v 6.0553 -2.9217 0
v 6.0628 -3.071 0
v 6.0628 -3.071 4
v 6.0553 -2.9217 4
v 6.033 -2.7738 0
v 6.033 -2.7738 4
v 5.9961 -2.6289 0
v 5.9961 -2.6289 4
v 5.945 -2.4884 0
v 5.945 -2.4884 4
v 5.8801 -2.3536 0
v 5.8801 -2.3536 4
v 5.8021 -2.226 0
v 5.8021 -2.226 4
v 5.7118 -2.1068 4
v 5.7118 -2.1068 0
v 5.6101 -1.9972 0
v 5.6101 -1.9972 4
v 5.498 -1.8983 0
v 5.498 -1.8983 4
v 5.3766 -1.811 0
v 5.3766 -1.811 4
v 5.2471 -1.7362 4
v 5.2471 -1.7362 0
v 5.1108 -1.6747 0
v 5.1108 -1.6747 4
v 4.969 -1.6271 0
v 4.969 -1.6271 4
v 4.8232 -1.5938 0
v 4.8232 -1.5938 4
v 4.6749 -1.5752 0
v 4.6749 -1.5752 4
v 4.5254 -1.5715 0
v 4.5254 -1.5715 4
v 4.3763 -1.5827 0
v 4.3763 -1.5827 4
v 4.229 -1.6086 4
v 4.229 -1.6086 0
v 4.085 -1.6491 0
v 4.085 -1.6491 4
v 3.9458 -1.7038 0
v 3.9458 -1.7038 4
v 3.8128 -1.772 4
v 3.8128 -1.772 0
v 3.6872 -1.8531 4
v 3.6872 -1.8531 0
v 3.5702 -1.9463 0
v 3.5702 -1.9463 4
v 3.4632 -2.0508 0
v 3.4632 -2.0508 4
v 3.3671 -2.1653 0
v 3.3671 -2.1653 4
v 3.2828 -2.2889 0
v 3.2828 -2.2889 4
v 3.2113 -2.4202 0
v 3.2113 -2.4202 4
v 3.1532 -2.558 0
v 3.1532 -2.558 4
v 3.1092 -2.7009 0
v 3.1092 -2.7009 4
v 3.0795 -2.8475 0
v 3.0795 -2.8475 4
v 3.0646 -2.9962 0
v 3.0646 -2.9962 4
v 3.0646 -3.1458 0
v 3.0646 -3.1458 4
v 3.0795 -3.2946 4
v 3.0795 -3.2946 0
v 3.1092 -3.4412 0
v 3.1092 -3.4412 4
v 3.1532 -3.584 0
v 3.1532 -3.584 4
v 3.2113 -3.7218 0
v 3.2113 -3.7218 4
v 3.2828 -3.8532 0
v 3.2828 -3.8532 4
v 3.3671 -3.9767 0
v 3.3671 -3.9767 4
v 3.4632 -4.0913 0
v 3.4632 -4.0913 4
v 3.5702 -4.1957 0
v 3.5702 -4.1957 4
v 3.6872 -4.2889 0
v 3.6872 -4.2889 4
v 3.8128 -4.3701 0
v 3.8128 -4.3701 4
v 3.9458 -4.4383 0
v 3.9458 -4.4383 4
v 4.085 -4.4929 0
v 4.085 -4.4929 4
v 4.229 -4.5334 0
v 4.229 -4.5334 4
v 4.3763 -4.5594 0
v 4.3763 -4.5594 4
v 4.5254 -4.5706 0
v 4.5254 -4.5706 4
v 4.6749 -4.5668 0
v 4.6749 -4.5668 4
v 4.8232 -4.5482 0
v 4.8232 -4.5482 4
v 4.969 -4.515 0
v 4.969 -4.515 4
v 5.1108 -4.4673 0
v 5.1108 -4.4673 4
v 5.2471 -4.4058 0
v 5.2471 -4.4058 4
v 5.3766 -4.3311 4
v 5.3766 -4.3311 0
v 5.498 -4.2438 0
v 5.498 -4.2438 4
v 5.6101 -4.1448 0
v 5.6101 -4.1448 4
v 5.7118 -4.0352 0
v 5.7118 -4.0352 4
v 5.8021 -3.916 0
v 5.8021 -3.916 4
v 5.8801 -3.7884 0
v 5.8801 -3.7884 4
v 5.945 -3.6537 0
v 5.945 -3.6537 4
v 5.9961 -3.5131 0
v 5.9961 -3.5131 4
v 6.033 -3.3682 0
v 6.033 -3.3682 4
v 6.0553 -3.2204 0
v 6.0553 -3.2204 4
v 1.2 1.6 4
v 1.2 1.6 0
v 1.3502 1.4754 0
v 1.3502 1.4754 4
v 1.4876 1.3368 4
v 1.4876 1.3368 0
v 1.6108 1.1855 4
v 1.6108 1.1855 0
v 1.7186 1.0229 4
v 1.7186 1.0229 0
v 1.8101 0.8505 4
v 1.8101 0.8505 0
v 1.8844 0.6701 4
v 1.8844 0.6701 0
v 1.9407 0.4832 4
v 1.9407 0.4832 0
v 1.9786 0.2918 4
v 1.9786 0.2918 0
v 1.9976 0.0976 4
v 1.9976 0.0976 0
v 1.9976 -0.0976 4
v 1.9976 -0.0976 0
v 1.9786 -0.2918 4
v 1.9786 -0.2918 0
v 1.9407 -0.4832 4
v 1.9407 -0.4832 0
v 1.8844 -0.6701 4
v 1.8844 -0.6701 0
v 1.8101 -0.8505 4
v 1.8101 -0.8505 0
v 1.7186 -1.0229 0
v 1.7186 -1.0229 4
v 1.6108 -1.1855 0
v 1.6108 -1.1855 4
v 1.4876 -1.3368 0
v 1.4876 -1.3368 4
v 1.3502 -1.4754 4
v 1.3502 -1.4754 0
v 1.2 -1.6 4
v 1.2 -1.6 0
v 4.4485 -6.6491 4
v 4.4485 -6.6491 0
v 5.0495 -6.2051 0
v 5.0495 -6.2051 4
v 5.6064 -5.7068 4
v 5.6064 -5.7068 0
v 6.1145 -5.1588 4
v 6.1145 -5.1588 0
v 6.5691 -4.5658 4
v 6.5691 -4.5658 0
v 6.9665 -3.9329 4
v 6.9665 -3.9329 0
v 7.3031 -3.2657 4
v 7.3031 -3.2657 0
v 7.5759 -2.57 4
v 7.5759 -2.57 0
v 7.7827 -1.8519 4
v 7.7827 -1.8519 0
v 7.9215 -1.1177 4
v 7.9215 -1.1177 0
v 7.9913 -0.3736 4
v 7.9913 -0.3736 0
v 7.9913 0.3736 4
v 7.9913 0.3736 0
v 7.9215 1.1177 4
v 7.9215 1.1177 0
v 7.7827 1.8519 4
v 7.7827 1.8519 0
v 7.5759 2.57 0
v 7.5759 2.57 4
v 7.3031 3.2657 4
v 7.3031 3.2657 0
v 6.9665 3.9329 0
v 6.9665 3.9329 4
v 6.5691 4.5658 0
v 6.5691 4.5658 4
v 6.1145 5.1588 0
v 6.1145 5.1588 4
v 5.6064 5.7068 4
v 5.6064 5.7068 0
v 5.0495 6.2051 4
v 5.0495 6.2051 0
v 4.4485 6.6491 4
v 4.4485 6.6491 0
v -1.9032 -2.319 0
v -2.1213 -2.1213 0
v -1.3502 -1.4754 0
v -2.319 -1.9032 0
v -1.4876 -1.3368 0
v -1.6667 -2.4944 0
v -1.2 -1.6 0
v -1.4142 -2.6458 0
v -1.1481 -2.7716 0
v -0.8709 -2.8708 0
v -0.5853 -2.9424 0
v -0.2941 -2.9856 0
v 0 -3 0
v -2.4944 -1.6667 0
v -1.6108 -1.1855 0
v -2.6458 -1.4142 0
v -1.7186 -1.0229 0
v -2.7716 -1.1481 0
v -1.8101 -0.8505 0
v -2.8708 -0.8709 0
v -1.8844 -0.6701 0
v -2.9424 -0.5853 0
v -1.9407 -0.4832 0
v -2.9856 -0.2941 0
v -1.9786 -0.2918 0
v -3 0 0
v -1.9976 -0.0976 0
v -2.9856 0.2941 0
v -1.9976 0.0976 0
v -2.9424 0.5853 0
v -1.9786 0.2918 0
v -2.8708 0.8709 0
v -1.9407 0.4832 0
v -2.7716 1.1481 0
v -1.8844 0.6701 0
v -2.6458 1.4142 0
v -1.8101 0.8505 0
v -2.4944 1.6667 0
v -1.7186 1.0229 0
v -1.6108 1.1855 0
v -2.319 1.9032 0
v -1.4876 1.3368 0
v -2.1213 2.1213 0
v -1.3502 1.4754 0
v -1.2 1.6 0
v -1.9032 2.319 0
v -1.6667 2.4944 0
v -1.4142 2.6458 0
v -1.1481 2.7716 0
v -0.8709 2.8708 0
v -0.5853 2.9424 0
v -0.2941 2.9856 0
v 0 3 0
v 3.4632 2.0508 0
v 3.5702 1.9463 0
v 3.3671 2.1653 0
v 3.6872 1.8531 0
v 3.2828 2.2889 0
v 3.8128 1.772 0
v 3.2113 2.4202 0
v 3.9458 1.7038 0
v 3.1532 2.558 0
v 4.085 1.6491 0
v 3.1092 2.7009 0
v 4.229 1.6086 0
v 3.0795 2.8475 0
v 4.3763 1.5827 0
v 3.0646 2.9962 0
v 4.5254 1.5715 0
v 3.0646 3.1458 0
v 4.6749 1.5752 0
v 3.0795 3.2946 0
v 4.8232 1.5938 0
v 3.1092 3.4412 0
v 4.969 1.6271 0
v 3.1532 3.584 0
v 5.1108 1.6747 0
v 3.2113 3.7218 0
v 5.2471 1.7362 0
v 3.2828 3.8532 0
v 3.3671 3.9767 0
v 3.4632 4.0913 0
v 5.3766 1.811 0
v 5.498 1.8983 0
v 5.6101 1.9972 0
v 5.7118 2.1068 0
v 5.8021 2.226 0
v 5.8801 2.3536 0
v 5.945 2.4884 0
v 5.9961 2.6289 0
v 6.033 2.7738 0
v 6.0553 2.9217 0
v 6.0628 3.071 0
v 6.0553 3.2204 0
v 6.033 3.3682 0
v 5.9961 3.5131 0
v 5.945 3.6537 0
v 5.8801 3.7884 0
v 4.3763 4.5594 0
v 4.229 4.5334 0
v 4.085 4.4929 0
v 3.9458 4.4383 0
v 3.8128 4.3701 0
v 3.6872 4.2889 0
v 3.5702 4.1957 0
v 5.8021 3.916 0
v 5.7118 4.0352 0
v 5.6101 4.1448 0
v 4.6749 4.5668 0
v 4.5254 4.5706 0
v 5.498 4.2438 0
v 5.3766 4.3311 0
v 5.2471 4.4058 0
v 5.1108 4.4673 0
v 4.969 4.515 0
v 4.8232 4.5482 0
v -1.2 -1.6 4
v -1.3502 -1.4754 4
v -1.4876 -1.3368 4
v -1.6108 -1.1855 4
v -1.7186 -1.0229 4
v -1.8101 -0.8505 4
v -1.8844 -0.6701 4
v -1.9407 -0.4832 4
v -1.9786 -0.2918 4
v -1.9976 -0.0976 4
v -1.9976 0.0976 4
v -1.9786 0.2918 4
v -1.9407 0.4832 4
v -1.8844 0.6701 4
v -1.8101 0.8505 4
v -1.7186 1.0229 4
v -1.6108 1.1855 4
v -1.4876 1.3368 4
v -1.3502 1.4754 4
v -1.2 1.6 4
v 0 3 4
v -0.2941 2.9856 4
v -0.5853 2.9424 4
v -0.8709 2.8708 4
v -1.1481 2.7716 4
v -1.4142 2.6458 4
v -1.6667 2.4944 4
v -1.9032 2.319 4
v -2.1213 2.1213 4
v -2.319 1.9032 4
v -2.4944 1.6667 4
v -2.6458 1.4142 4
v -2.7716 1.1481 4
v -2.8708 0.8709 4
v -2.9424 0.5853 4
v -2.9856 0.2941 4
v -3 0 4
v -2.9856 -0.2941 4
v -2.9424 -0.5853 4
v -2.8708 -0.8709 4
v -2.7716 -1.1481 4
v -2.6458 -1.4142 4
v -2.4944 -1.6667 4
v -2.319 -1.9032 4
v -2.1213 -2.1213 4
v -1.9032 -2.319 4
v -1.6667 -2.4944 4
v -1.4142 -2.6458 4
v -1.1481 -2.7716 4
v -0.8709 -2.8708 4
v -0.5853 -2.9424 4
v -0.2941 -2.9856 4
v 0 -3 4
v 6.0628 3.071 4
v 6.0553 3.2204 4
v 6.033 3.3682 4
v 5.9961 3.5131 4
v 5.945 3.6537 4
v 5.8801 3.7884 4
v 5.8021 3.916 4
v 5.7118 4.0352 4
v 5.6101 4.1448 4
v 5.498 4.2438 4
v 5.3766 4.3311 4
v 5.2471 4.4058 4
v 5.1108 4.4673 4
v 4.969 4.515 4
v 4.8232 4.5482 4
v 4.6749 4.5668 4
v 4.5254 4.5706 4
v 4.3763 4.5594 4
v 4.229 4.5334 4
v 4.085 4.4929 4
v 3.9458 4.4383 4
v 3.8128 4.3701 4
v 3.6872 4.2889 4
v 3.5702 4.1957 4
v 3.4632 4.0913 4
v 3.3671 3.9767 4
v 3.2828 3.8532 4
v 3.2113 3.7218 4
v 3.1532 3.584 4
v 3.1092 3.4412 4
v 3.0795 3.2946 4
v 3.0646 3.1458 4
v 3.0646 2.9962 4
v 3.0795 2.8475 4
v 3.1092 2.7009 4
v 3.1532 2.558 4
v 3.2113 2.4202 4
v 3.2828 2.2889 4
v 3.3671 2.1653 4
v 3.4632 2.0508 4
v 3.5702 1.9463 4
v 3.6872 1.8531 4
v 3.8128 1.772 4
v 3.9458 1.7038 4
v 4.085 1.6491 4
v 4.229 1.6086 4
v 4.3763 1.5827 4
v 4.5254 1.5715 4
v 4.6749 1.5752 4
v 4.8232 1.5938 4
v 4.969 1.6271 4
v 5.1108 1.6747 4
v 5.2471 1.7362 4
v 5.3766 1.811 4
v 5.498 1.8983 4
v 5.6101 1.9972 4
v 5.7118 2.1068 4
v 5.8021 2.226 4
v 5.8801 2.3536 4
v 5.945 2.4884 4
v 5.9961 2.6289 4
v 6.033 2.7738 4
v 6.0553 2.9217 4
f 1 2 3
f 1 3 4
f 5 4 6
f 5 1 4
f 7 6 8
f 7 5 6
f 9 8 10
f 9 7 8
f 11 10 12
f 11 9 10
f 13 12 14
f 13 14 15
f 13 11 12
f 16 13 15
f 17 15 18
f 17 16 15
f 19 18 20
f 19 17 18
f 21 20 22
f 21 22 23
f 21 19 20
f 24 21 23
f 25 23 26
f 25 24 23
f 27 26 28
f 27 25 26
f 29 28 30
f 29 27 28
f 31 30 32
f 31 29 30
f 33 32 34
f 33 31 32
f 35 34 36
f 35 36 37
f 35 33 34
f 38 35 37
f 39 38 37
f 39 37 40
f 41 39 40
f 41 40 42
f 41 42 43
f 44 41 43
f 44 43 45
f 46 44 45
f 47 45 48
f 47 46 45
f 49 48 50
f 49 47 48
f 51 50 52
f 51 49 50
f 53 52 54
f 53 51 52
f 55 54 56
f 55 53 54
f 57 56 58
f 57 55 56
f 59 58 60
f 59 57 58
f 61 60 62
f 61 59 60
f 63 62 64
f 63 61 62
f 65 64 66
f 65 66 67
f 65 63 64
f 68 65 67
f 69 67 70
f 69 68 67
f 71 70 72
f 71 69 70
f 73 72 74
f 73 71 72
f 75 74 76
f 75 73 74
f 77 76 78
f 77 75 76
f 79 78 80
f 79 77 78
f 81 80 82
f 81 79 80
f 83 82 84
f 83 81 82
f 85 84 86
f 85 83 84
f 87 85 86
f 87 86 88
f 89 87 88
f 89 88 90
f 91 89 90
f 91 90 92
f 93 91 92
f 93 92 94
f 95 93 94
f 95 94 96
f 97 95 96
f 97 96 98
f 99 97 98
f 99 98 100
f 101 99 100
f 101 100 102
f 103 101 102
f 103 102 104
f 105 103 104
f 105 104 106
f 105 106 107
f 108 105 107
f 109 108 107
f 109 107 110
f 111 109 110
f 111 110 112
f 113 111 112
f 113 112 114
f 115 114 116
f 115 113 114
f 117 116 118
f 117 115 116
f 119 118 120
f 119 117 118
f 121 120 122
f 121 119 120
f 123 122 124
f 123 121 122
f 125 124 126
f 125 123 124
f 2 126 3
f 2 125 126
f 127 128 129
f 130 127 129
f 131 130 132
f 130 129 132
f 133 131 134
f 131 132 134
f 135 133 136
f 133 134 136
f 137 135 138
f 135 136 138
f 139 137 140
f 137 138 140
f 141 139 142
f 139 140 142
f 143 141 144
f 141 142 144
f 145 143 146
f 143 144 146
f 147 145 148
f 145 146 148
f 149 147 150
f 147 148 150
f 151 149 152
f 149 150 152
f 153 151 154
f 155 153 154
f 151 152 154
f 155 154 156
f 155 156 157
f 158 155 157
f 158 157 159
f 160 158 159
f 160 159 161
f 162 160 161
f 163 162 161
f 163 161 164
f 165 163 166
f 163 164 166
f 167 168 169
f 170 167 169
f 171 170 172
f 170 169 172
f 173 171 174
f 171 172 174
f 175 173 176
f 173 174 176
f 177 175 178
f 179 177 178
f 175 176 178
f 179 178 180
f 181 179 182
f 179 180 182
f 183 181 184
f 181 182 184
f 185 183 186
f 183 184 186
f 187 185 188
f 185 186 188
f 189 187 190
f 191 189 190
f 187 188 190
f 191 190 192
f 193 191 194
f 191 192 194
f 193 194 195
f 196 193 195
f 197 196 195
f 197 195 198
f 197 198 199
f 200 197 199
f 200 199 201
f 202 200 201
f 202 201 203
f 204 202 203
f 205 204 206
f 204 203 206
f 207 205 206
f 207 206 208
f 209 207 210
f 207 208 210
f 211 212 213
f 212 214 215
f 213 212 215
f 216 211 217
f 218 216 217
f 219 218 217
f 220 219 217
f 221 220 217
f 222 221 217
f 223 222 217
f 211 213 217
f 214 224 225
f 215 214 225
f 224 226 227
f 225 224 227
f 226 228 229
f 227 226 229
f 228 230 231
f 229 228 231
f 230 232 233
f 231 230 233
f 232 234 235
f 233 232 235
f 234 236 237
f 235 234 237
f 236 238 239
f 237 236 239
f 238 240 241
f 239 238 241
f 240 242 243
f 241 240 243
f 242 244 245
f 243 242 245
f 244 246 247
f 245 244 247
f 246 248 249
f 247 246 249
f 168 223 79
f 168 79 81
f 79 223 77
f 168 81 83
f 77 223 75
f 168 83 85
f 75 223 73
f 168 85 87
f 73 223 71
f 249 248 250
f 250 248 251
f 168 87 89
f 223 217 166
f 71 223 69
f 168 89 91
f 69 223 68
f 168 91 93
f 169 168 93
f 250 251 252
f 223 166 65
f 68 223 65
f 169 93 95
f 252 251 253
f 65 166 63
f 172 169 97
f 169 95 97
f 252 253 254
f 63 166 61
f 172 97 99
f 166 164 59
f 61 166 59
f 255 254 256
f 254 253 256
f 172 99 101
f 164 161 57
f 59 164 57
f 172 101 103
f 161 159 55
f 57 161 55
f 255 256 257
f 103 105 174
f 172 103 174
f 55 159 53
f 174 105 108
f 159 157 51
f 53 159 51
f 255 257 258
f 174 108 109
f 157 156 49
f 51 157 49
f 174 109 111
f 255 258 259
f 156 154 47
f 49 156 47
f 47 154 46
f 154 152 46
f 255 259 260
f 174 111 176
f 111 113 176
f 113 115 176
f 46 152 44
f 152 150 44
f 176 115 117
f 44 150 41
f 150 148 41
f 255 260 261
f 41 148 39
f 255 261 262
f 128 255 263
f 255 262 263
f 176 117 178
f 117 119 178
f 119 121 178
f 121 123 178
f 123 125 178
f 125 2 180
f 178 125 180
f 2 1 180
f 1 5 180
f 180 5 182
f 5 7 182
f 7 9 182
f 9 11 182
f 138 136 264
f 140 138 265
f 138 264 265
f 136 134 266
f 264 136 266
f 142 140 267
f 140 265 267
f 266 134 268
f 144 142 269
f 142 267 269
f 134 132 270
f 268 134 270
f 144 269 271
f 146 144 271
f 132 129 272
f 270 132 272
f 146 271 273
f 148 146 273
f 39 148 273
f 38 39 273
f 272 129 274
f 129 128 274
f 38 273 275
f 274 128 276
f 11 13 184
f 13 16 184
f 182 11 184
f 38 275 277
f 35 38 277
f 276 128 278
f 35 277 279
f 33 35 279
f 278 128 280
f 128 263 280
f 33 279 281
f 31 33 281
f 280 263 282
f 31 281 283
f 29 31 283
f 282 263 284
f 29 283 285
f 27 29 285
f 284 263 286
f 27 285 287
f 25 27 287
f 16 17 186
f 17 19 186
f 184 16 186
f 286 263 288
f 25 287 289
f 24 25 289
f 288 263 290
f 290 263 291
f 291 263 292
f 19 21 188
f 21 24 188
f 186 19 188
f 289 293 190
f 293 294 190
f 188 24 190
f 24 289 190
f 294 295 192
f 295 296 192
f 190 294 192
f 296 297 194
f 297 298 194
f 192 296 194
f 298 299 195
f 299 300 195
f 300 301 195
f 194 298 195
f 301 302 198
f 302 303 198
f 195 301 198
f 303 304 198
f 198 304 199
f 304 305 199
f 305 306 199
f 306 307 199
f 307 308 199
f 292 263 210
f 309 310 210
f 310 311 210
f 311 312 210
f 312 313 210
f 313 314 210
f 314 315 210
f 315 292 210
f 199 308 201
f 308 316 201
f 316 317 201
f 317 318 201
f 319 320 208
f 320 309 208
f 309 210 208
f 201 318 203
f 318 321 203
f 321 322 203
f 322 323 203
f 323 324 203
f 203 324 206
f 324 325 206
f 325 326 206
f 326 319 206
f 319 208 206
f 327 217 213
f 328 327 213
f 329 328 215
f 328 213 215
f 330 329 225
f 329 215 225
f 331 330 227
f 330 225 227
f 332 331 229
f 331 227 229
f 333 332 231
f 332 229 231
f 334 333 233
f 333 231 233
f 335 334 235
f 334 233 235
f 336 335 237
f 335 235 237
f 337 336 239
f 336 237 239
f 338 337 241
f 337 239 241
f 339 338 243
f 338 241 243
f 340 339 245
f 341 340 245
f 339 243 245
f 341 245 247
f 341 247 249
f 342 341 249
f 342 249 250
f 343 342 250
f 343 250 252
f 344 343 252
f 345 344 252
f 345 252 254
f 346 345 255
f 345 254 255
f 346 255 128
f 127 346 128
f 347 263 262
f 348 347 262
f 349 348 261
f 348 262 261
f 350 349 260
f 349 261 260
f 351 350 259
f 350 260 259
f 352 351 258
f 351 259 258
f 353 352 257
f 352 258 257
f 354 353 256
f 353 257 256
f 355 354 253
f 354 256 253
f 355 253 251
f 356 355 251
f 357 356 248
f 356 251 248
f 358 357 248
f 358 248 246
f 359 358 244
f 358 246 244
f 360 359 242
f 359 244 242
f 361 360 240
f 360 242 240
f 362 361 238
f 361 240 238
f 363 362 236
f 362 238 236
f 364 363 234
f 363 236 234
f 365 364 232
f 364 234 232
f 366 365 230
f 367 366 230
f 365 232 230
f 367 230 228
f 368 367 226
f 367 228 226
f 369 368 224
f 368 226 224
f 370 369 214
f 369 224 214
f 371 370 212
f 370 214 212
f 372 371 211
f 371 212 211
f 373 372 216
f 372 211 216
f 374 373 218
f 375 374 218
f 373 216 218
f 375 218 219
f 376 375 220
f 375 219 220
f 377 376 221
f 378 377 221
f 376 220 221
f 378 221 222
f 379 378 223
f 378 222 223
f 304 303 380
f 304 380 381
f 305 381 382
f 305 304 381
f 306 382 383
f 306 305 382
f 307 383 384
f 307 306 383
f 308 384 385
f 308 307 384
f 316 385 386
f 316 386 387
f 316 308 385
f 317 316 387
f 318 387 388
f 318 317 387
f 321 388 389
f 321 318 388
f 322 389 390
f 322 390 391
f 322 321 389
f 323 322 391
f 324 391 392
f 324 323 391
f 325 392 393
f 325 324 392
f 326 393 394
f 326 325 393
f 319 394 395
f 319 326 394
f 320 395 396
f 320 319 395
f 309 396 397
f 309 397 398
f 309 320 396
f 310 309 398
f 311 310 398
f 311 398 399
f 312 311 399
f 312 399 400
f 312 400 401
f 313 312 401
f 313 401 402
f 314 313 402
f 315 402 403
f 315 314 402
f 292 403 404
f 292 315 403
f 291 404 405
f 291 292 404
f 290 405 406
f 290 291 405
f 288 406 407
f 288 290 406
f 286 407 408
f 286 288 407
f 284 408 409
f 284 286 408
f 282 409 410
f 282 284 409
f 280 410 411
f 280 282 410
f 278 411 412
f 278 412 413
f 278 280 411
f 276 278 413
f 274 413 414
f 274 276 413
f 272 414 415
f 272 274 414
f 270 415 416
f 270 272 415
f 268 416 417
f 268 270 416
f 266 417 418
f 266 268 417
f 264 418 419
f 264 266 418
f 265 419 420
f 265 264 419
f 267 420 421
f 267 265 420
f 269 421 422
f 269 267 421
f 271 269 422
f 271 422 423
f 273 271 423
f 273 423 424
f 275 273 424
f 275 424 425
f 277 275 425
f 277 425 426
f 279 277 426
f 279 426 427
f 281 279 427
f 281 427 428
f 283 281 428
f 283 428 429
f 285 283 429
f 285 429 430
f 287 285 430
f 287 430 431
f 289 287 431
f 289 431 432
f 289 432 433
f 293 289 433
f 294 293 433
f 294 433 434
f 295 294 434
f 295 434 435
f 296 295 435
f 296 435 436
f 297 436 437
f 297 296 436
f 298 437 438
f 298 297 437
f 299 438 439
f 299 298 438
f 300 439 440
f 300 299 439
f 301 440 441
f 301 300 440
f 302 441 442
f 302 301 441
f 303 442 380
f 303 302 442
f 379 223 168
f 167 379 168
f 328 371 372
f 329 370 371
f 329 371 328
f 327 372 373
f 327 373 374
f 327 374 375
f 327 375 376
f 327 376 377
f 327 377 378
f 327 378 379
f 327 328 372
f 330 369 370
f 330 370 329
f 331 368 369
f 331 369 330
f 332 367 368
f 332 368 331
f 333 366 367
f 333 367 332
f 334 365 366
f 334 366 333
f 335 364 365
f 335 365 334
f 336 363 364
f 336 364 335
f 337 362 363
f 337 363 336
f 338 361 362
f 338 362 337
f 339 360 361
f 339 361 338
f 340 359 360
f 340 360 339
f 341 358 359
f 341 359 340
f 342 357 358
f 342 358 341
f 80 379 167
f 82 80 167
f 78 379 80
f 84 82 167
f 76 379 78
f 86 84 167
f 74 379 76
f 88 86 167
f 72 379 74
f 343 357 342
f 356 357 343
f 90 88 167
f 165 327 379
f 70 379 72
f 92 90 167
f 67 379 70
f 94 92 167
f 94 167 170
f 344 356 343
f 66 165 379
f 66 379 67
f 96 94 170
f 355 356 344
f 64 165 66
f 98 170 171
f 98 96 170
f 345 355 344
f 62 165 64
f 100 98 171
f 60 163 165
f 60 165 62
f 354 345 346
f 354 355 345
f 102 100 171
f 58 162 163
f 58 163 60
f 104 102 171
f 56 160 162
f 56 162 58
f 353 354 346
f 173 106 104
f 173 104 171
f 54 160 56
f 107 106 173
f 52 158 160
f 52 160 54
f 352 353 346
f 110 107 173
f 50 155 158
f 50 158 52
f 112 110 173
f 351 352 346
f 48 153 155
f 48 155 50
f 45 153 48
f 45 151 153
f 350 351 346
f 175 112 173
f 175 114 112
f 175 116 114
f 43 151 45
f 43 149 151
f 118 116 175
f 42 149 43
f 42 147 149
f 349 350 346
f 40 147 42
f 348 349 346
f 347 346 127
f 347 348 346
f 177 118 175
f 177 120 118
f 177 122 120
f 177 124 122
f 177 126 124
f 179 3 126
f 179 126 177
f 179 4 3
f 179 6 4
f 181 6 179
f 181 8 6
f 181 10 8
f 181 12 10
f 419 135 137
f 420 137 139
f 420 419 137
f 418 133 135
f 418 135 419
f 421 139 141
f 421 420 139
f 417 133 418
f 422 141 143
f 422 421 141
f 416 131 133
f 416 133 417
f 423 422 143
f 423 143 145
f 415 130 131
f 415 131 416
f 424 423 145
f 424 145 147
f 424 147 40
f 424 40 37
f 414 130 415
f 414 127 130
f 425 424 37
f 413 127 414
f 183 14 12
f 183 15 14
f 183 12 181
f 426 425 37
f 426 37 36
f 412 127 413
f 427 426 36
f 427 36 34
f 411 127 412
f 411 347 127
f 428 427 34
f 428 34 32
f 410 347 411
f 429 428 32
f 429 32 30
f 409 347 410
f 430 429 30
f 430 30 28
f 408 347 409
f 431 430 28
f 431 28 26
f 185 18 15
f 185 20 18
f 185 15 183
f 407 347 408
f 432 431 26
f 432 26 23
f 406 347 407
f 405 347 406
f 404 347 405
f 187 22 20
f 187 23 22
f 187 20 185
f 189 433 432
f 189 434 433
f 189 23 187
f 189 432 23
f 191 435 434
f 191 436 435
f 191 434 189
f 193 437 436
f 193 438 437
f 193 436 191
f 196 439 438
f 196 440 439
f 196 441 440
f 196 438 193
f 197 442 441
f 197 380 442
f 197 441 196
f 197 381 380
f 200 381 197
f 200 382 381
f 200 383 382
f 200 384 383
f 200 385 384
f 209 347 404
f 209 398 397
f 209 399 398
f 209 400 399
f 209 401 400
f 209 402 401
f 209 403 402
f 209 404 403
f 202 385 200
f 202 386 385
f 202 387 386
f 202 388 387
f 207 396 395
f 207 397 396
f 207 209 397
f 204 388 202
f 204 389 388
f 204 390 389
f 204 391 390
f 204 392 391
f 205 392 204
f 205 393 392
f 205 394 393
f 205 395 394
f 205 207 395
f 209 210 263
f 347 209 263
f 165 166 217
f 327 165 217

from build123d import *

# Parameters (mm, degrees)
F0_R     = 1.5
F1_DEPTH = 4


with BuildPart() as f1:
    # F0 (on Top) → F1 (new body)
    with BuildSketch(Plane.XY):
        with BuildLine():
            ThreePointArc((0, 3), (2.12132, 2.12132), (3, 0))
            ThreePointArc((3, 0), (2.12132, -2.12132), (0, -3))
            Line((0, -3), (4.448474, -6.649141))
            ThreePointArc((4.448474, -6.649141), (8, 0), (4.448474, 6.649141))
            Line((4.448474, 6.649141), (0, 3))
        make_face()
        with Locations((4.562768, -3.071017)):
            Circle(F0_R, mode=Mode.SUBTRACT)
        with Locations((4.562768, 3.071017)):
            Circle(F0_R, mode=Mode.SUBTRACT)
        with BuildLine():
            ThreePointArc((0, -3), (2.12132, -2.12132), (3, 0))
            ThreePointArc((3, 0), (2.12132, 2.12132), (0, 3))
            ThreePointArc((0, 3), (-3, 0), (0, -3))
        make_face()
        with BuildLine():
            ThreePointArc((1.2, 1.6), (2, 0), (1.2, -1.6))
            Line((1.2, -1.6), (-1.2, -1.6))
            ThreePointArc((-1.2, -1.6), (-2, 0), (-1.2, 1.6))
            Line((-1.2, 1.6), (1.2, 1.6))
        make_face(mode=Mode.SUBTRACT)
    extrude(amount=F1_DEPTH)


solid = f1.part
